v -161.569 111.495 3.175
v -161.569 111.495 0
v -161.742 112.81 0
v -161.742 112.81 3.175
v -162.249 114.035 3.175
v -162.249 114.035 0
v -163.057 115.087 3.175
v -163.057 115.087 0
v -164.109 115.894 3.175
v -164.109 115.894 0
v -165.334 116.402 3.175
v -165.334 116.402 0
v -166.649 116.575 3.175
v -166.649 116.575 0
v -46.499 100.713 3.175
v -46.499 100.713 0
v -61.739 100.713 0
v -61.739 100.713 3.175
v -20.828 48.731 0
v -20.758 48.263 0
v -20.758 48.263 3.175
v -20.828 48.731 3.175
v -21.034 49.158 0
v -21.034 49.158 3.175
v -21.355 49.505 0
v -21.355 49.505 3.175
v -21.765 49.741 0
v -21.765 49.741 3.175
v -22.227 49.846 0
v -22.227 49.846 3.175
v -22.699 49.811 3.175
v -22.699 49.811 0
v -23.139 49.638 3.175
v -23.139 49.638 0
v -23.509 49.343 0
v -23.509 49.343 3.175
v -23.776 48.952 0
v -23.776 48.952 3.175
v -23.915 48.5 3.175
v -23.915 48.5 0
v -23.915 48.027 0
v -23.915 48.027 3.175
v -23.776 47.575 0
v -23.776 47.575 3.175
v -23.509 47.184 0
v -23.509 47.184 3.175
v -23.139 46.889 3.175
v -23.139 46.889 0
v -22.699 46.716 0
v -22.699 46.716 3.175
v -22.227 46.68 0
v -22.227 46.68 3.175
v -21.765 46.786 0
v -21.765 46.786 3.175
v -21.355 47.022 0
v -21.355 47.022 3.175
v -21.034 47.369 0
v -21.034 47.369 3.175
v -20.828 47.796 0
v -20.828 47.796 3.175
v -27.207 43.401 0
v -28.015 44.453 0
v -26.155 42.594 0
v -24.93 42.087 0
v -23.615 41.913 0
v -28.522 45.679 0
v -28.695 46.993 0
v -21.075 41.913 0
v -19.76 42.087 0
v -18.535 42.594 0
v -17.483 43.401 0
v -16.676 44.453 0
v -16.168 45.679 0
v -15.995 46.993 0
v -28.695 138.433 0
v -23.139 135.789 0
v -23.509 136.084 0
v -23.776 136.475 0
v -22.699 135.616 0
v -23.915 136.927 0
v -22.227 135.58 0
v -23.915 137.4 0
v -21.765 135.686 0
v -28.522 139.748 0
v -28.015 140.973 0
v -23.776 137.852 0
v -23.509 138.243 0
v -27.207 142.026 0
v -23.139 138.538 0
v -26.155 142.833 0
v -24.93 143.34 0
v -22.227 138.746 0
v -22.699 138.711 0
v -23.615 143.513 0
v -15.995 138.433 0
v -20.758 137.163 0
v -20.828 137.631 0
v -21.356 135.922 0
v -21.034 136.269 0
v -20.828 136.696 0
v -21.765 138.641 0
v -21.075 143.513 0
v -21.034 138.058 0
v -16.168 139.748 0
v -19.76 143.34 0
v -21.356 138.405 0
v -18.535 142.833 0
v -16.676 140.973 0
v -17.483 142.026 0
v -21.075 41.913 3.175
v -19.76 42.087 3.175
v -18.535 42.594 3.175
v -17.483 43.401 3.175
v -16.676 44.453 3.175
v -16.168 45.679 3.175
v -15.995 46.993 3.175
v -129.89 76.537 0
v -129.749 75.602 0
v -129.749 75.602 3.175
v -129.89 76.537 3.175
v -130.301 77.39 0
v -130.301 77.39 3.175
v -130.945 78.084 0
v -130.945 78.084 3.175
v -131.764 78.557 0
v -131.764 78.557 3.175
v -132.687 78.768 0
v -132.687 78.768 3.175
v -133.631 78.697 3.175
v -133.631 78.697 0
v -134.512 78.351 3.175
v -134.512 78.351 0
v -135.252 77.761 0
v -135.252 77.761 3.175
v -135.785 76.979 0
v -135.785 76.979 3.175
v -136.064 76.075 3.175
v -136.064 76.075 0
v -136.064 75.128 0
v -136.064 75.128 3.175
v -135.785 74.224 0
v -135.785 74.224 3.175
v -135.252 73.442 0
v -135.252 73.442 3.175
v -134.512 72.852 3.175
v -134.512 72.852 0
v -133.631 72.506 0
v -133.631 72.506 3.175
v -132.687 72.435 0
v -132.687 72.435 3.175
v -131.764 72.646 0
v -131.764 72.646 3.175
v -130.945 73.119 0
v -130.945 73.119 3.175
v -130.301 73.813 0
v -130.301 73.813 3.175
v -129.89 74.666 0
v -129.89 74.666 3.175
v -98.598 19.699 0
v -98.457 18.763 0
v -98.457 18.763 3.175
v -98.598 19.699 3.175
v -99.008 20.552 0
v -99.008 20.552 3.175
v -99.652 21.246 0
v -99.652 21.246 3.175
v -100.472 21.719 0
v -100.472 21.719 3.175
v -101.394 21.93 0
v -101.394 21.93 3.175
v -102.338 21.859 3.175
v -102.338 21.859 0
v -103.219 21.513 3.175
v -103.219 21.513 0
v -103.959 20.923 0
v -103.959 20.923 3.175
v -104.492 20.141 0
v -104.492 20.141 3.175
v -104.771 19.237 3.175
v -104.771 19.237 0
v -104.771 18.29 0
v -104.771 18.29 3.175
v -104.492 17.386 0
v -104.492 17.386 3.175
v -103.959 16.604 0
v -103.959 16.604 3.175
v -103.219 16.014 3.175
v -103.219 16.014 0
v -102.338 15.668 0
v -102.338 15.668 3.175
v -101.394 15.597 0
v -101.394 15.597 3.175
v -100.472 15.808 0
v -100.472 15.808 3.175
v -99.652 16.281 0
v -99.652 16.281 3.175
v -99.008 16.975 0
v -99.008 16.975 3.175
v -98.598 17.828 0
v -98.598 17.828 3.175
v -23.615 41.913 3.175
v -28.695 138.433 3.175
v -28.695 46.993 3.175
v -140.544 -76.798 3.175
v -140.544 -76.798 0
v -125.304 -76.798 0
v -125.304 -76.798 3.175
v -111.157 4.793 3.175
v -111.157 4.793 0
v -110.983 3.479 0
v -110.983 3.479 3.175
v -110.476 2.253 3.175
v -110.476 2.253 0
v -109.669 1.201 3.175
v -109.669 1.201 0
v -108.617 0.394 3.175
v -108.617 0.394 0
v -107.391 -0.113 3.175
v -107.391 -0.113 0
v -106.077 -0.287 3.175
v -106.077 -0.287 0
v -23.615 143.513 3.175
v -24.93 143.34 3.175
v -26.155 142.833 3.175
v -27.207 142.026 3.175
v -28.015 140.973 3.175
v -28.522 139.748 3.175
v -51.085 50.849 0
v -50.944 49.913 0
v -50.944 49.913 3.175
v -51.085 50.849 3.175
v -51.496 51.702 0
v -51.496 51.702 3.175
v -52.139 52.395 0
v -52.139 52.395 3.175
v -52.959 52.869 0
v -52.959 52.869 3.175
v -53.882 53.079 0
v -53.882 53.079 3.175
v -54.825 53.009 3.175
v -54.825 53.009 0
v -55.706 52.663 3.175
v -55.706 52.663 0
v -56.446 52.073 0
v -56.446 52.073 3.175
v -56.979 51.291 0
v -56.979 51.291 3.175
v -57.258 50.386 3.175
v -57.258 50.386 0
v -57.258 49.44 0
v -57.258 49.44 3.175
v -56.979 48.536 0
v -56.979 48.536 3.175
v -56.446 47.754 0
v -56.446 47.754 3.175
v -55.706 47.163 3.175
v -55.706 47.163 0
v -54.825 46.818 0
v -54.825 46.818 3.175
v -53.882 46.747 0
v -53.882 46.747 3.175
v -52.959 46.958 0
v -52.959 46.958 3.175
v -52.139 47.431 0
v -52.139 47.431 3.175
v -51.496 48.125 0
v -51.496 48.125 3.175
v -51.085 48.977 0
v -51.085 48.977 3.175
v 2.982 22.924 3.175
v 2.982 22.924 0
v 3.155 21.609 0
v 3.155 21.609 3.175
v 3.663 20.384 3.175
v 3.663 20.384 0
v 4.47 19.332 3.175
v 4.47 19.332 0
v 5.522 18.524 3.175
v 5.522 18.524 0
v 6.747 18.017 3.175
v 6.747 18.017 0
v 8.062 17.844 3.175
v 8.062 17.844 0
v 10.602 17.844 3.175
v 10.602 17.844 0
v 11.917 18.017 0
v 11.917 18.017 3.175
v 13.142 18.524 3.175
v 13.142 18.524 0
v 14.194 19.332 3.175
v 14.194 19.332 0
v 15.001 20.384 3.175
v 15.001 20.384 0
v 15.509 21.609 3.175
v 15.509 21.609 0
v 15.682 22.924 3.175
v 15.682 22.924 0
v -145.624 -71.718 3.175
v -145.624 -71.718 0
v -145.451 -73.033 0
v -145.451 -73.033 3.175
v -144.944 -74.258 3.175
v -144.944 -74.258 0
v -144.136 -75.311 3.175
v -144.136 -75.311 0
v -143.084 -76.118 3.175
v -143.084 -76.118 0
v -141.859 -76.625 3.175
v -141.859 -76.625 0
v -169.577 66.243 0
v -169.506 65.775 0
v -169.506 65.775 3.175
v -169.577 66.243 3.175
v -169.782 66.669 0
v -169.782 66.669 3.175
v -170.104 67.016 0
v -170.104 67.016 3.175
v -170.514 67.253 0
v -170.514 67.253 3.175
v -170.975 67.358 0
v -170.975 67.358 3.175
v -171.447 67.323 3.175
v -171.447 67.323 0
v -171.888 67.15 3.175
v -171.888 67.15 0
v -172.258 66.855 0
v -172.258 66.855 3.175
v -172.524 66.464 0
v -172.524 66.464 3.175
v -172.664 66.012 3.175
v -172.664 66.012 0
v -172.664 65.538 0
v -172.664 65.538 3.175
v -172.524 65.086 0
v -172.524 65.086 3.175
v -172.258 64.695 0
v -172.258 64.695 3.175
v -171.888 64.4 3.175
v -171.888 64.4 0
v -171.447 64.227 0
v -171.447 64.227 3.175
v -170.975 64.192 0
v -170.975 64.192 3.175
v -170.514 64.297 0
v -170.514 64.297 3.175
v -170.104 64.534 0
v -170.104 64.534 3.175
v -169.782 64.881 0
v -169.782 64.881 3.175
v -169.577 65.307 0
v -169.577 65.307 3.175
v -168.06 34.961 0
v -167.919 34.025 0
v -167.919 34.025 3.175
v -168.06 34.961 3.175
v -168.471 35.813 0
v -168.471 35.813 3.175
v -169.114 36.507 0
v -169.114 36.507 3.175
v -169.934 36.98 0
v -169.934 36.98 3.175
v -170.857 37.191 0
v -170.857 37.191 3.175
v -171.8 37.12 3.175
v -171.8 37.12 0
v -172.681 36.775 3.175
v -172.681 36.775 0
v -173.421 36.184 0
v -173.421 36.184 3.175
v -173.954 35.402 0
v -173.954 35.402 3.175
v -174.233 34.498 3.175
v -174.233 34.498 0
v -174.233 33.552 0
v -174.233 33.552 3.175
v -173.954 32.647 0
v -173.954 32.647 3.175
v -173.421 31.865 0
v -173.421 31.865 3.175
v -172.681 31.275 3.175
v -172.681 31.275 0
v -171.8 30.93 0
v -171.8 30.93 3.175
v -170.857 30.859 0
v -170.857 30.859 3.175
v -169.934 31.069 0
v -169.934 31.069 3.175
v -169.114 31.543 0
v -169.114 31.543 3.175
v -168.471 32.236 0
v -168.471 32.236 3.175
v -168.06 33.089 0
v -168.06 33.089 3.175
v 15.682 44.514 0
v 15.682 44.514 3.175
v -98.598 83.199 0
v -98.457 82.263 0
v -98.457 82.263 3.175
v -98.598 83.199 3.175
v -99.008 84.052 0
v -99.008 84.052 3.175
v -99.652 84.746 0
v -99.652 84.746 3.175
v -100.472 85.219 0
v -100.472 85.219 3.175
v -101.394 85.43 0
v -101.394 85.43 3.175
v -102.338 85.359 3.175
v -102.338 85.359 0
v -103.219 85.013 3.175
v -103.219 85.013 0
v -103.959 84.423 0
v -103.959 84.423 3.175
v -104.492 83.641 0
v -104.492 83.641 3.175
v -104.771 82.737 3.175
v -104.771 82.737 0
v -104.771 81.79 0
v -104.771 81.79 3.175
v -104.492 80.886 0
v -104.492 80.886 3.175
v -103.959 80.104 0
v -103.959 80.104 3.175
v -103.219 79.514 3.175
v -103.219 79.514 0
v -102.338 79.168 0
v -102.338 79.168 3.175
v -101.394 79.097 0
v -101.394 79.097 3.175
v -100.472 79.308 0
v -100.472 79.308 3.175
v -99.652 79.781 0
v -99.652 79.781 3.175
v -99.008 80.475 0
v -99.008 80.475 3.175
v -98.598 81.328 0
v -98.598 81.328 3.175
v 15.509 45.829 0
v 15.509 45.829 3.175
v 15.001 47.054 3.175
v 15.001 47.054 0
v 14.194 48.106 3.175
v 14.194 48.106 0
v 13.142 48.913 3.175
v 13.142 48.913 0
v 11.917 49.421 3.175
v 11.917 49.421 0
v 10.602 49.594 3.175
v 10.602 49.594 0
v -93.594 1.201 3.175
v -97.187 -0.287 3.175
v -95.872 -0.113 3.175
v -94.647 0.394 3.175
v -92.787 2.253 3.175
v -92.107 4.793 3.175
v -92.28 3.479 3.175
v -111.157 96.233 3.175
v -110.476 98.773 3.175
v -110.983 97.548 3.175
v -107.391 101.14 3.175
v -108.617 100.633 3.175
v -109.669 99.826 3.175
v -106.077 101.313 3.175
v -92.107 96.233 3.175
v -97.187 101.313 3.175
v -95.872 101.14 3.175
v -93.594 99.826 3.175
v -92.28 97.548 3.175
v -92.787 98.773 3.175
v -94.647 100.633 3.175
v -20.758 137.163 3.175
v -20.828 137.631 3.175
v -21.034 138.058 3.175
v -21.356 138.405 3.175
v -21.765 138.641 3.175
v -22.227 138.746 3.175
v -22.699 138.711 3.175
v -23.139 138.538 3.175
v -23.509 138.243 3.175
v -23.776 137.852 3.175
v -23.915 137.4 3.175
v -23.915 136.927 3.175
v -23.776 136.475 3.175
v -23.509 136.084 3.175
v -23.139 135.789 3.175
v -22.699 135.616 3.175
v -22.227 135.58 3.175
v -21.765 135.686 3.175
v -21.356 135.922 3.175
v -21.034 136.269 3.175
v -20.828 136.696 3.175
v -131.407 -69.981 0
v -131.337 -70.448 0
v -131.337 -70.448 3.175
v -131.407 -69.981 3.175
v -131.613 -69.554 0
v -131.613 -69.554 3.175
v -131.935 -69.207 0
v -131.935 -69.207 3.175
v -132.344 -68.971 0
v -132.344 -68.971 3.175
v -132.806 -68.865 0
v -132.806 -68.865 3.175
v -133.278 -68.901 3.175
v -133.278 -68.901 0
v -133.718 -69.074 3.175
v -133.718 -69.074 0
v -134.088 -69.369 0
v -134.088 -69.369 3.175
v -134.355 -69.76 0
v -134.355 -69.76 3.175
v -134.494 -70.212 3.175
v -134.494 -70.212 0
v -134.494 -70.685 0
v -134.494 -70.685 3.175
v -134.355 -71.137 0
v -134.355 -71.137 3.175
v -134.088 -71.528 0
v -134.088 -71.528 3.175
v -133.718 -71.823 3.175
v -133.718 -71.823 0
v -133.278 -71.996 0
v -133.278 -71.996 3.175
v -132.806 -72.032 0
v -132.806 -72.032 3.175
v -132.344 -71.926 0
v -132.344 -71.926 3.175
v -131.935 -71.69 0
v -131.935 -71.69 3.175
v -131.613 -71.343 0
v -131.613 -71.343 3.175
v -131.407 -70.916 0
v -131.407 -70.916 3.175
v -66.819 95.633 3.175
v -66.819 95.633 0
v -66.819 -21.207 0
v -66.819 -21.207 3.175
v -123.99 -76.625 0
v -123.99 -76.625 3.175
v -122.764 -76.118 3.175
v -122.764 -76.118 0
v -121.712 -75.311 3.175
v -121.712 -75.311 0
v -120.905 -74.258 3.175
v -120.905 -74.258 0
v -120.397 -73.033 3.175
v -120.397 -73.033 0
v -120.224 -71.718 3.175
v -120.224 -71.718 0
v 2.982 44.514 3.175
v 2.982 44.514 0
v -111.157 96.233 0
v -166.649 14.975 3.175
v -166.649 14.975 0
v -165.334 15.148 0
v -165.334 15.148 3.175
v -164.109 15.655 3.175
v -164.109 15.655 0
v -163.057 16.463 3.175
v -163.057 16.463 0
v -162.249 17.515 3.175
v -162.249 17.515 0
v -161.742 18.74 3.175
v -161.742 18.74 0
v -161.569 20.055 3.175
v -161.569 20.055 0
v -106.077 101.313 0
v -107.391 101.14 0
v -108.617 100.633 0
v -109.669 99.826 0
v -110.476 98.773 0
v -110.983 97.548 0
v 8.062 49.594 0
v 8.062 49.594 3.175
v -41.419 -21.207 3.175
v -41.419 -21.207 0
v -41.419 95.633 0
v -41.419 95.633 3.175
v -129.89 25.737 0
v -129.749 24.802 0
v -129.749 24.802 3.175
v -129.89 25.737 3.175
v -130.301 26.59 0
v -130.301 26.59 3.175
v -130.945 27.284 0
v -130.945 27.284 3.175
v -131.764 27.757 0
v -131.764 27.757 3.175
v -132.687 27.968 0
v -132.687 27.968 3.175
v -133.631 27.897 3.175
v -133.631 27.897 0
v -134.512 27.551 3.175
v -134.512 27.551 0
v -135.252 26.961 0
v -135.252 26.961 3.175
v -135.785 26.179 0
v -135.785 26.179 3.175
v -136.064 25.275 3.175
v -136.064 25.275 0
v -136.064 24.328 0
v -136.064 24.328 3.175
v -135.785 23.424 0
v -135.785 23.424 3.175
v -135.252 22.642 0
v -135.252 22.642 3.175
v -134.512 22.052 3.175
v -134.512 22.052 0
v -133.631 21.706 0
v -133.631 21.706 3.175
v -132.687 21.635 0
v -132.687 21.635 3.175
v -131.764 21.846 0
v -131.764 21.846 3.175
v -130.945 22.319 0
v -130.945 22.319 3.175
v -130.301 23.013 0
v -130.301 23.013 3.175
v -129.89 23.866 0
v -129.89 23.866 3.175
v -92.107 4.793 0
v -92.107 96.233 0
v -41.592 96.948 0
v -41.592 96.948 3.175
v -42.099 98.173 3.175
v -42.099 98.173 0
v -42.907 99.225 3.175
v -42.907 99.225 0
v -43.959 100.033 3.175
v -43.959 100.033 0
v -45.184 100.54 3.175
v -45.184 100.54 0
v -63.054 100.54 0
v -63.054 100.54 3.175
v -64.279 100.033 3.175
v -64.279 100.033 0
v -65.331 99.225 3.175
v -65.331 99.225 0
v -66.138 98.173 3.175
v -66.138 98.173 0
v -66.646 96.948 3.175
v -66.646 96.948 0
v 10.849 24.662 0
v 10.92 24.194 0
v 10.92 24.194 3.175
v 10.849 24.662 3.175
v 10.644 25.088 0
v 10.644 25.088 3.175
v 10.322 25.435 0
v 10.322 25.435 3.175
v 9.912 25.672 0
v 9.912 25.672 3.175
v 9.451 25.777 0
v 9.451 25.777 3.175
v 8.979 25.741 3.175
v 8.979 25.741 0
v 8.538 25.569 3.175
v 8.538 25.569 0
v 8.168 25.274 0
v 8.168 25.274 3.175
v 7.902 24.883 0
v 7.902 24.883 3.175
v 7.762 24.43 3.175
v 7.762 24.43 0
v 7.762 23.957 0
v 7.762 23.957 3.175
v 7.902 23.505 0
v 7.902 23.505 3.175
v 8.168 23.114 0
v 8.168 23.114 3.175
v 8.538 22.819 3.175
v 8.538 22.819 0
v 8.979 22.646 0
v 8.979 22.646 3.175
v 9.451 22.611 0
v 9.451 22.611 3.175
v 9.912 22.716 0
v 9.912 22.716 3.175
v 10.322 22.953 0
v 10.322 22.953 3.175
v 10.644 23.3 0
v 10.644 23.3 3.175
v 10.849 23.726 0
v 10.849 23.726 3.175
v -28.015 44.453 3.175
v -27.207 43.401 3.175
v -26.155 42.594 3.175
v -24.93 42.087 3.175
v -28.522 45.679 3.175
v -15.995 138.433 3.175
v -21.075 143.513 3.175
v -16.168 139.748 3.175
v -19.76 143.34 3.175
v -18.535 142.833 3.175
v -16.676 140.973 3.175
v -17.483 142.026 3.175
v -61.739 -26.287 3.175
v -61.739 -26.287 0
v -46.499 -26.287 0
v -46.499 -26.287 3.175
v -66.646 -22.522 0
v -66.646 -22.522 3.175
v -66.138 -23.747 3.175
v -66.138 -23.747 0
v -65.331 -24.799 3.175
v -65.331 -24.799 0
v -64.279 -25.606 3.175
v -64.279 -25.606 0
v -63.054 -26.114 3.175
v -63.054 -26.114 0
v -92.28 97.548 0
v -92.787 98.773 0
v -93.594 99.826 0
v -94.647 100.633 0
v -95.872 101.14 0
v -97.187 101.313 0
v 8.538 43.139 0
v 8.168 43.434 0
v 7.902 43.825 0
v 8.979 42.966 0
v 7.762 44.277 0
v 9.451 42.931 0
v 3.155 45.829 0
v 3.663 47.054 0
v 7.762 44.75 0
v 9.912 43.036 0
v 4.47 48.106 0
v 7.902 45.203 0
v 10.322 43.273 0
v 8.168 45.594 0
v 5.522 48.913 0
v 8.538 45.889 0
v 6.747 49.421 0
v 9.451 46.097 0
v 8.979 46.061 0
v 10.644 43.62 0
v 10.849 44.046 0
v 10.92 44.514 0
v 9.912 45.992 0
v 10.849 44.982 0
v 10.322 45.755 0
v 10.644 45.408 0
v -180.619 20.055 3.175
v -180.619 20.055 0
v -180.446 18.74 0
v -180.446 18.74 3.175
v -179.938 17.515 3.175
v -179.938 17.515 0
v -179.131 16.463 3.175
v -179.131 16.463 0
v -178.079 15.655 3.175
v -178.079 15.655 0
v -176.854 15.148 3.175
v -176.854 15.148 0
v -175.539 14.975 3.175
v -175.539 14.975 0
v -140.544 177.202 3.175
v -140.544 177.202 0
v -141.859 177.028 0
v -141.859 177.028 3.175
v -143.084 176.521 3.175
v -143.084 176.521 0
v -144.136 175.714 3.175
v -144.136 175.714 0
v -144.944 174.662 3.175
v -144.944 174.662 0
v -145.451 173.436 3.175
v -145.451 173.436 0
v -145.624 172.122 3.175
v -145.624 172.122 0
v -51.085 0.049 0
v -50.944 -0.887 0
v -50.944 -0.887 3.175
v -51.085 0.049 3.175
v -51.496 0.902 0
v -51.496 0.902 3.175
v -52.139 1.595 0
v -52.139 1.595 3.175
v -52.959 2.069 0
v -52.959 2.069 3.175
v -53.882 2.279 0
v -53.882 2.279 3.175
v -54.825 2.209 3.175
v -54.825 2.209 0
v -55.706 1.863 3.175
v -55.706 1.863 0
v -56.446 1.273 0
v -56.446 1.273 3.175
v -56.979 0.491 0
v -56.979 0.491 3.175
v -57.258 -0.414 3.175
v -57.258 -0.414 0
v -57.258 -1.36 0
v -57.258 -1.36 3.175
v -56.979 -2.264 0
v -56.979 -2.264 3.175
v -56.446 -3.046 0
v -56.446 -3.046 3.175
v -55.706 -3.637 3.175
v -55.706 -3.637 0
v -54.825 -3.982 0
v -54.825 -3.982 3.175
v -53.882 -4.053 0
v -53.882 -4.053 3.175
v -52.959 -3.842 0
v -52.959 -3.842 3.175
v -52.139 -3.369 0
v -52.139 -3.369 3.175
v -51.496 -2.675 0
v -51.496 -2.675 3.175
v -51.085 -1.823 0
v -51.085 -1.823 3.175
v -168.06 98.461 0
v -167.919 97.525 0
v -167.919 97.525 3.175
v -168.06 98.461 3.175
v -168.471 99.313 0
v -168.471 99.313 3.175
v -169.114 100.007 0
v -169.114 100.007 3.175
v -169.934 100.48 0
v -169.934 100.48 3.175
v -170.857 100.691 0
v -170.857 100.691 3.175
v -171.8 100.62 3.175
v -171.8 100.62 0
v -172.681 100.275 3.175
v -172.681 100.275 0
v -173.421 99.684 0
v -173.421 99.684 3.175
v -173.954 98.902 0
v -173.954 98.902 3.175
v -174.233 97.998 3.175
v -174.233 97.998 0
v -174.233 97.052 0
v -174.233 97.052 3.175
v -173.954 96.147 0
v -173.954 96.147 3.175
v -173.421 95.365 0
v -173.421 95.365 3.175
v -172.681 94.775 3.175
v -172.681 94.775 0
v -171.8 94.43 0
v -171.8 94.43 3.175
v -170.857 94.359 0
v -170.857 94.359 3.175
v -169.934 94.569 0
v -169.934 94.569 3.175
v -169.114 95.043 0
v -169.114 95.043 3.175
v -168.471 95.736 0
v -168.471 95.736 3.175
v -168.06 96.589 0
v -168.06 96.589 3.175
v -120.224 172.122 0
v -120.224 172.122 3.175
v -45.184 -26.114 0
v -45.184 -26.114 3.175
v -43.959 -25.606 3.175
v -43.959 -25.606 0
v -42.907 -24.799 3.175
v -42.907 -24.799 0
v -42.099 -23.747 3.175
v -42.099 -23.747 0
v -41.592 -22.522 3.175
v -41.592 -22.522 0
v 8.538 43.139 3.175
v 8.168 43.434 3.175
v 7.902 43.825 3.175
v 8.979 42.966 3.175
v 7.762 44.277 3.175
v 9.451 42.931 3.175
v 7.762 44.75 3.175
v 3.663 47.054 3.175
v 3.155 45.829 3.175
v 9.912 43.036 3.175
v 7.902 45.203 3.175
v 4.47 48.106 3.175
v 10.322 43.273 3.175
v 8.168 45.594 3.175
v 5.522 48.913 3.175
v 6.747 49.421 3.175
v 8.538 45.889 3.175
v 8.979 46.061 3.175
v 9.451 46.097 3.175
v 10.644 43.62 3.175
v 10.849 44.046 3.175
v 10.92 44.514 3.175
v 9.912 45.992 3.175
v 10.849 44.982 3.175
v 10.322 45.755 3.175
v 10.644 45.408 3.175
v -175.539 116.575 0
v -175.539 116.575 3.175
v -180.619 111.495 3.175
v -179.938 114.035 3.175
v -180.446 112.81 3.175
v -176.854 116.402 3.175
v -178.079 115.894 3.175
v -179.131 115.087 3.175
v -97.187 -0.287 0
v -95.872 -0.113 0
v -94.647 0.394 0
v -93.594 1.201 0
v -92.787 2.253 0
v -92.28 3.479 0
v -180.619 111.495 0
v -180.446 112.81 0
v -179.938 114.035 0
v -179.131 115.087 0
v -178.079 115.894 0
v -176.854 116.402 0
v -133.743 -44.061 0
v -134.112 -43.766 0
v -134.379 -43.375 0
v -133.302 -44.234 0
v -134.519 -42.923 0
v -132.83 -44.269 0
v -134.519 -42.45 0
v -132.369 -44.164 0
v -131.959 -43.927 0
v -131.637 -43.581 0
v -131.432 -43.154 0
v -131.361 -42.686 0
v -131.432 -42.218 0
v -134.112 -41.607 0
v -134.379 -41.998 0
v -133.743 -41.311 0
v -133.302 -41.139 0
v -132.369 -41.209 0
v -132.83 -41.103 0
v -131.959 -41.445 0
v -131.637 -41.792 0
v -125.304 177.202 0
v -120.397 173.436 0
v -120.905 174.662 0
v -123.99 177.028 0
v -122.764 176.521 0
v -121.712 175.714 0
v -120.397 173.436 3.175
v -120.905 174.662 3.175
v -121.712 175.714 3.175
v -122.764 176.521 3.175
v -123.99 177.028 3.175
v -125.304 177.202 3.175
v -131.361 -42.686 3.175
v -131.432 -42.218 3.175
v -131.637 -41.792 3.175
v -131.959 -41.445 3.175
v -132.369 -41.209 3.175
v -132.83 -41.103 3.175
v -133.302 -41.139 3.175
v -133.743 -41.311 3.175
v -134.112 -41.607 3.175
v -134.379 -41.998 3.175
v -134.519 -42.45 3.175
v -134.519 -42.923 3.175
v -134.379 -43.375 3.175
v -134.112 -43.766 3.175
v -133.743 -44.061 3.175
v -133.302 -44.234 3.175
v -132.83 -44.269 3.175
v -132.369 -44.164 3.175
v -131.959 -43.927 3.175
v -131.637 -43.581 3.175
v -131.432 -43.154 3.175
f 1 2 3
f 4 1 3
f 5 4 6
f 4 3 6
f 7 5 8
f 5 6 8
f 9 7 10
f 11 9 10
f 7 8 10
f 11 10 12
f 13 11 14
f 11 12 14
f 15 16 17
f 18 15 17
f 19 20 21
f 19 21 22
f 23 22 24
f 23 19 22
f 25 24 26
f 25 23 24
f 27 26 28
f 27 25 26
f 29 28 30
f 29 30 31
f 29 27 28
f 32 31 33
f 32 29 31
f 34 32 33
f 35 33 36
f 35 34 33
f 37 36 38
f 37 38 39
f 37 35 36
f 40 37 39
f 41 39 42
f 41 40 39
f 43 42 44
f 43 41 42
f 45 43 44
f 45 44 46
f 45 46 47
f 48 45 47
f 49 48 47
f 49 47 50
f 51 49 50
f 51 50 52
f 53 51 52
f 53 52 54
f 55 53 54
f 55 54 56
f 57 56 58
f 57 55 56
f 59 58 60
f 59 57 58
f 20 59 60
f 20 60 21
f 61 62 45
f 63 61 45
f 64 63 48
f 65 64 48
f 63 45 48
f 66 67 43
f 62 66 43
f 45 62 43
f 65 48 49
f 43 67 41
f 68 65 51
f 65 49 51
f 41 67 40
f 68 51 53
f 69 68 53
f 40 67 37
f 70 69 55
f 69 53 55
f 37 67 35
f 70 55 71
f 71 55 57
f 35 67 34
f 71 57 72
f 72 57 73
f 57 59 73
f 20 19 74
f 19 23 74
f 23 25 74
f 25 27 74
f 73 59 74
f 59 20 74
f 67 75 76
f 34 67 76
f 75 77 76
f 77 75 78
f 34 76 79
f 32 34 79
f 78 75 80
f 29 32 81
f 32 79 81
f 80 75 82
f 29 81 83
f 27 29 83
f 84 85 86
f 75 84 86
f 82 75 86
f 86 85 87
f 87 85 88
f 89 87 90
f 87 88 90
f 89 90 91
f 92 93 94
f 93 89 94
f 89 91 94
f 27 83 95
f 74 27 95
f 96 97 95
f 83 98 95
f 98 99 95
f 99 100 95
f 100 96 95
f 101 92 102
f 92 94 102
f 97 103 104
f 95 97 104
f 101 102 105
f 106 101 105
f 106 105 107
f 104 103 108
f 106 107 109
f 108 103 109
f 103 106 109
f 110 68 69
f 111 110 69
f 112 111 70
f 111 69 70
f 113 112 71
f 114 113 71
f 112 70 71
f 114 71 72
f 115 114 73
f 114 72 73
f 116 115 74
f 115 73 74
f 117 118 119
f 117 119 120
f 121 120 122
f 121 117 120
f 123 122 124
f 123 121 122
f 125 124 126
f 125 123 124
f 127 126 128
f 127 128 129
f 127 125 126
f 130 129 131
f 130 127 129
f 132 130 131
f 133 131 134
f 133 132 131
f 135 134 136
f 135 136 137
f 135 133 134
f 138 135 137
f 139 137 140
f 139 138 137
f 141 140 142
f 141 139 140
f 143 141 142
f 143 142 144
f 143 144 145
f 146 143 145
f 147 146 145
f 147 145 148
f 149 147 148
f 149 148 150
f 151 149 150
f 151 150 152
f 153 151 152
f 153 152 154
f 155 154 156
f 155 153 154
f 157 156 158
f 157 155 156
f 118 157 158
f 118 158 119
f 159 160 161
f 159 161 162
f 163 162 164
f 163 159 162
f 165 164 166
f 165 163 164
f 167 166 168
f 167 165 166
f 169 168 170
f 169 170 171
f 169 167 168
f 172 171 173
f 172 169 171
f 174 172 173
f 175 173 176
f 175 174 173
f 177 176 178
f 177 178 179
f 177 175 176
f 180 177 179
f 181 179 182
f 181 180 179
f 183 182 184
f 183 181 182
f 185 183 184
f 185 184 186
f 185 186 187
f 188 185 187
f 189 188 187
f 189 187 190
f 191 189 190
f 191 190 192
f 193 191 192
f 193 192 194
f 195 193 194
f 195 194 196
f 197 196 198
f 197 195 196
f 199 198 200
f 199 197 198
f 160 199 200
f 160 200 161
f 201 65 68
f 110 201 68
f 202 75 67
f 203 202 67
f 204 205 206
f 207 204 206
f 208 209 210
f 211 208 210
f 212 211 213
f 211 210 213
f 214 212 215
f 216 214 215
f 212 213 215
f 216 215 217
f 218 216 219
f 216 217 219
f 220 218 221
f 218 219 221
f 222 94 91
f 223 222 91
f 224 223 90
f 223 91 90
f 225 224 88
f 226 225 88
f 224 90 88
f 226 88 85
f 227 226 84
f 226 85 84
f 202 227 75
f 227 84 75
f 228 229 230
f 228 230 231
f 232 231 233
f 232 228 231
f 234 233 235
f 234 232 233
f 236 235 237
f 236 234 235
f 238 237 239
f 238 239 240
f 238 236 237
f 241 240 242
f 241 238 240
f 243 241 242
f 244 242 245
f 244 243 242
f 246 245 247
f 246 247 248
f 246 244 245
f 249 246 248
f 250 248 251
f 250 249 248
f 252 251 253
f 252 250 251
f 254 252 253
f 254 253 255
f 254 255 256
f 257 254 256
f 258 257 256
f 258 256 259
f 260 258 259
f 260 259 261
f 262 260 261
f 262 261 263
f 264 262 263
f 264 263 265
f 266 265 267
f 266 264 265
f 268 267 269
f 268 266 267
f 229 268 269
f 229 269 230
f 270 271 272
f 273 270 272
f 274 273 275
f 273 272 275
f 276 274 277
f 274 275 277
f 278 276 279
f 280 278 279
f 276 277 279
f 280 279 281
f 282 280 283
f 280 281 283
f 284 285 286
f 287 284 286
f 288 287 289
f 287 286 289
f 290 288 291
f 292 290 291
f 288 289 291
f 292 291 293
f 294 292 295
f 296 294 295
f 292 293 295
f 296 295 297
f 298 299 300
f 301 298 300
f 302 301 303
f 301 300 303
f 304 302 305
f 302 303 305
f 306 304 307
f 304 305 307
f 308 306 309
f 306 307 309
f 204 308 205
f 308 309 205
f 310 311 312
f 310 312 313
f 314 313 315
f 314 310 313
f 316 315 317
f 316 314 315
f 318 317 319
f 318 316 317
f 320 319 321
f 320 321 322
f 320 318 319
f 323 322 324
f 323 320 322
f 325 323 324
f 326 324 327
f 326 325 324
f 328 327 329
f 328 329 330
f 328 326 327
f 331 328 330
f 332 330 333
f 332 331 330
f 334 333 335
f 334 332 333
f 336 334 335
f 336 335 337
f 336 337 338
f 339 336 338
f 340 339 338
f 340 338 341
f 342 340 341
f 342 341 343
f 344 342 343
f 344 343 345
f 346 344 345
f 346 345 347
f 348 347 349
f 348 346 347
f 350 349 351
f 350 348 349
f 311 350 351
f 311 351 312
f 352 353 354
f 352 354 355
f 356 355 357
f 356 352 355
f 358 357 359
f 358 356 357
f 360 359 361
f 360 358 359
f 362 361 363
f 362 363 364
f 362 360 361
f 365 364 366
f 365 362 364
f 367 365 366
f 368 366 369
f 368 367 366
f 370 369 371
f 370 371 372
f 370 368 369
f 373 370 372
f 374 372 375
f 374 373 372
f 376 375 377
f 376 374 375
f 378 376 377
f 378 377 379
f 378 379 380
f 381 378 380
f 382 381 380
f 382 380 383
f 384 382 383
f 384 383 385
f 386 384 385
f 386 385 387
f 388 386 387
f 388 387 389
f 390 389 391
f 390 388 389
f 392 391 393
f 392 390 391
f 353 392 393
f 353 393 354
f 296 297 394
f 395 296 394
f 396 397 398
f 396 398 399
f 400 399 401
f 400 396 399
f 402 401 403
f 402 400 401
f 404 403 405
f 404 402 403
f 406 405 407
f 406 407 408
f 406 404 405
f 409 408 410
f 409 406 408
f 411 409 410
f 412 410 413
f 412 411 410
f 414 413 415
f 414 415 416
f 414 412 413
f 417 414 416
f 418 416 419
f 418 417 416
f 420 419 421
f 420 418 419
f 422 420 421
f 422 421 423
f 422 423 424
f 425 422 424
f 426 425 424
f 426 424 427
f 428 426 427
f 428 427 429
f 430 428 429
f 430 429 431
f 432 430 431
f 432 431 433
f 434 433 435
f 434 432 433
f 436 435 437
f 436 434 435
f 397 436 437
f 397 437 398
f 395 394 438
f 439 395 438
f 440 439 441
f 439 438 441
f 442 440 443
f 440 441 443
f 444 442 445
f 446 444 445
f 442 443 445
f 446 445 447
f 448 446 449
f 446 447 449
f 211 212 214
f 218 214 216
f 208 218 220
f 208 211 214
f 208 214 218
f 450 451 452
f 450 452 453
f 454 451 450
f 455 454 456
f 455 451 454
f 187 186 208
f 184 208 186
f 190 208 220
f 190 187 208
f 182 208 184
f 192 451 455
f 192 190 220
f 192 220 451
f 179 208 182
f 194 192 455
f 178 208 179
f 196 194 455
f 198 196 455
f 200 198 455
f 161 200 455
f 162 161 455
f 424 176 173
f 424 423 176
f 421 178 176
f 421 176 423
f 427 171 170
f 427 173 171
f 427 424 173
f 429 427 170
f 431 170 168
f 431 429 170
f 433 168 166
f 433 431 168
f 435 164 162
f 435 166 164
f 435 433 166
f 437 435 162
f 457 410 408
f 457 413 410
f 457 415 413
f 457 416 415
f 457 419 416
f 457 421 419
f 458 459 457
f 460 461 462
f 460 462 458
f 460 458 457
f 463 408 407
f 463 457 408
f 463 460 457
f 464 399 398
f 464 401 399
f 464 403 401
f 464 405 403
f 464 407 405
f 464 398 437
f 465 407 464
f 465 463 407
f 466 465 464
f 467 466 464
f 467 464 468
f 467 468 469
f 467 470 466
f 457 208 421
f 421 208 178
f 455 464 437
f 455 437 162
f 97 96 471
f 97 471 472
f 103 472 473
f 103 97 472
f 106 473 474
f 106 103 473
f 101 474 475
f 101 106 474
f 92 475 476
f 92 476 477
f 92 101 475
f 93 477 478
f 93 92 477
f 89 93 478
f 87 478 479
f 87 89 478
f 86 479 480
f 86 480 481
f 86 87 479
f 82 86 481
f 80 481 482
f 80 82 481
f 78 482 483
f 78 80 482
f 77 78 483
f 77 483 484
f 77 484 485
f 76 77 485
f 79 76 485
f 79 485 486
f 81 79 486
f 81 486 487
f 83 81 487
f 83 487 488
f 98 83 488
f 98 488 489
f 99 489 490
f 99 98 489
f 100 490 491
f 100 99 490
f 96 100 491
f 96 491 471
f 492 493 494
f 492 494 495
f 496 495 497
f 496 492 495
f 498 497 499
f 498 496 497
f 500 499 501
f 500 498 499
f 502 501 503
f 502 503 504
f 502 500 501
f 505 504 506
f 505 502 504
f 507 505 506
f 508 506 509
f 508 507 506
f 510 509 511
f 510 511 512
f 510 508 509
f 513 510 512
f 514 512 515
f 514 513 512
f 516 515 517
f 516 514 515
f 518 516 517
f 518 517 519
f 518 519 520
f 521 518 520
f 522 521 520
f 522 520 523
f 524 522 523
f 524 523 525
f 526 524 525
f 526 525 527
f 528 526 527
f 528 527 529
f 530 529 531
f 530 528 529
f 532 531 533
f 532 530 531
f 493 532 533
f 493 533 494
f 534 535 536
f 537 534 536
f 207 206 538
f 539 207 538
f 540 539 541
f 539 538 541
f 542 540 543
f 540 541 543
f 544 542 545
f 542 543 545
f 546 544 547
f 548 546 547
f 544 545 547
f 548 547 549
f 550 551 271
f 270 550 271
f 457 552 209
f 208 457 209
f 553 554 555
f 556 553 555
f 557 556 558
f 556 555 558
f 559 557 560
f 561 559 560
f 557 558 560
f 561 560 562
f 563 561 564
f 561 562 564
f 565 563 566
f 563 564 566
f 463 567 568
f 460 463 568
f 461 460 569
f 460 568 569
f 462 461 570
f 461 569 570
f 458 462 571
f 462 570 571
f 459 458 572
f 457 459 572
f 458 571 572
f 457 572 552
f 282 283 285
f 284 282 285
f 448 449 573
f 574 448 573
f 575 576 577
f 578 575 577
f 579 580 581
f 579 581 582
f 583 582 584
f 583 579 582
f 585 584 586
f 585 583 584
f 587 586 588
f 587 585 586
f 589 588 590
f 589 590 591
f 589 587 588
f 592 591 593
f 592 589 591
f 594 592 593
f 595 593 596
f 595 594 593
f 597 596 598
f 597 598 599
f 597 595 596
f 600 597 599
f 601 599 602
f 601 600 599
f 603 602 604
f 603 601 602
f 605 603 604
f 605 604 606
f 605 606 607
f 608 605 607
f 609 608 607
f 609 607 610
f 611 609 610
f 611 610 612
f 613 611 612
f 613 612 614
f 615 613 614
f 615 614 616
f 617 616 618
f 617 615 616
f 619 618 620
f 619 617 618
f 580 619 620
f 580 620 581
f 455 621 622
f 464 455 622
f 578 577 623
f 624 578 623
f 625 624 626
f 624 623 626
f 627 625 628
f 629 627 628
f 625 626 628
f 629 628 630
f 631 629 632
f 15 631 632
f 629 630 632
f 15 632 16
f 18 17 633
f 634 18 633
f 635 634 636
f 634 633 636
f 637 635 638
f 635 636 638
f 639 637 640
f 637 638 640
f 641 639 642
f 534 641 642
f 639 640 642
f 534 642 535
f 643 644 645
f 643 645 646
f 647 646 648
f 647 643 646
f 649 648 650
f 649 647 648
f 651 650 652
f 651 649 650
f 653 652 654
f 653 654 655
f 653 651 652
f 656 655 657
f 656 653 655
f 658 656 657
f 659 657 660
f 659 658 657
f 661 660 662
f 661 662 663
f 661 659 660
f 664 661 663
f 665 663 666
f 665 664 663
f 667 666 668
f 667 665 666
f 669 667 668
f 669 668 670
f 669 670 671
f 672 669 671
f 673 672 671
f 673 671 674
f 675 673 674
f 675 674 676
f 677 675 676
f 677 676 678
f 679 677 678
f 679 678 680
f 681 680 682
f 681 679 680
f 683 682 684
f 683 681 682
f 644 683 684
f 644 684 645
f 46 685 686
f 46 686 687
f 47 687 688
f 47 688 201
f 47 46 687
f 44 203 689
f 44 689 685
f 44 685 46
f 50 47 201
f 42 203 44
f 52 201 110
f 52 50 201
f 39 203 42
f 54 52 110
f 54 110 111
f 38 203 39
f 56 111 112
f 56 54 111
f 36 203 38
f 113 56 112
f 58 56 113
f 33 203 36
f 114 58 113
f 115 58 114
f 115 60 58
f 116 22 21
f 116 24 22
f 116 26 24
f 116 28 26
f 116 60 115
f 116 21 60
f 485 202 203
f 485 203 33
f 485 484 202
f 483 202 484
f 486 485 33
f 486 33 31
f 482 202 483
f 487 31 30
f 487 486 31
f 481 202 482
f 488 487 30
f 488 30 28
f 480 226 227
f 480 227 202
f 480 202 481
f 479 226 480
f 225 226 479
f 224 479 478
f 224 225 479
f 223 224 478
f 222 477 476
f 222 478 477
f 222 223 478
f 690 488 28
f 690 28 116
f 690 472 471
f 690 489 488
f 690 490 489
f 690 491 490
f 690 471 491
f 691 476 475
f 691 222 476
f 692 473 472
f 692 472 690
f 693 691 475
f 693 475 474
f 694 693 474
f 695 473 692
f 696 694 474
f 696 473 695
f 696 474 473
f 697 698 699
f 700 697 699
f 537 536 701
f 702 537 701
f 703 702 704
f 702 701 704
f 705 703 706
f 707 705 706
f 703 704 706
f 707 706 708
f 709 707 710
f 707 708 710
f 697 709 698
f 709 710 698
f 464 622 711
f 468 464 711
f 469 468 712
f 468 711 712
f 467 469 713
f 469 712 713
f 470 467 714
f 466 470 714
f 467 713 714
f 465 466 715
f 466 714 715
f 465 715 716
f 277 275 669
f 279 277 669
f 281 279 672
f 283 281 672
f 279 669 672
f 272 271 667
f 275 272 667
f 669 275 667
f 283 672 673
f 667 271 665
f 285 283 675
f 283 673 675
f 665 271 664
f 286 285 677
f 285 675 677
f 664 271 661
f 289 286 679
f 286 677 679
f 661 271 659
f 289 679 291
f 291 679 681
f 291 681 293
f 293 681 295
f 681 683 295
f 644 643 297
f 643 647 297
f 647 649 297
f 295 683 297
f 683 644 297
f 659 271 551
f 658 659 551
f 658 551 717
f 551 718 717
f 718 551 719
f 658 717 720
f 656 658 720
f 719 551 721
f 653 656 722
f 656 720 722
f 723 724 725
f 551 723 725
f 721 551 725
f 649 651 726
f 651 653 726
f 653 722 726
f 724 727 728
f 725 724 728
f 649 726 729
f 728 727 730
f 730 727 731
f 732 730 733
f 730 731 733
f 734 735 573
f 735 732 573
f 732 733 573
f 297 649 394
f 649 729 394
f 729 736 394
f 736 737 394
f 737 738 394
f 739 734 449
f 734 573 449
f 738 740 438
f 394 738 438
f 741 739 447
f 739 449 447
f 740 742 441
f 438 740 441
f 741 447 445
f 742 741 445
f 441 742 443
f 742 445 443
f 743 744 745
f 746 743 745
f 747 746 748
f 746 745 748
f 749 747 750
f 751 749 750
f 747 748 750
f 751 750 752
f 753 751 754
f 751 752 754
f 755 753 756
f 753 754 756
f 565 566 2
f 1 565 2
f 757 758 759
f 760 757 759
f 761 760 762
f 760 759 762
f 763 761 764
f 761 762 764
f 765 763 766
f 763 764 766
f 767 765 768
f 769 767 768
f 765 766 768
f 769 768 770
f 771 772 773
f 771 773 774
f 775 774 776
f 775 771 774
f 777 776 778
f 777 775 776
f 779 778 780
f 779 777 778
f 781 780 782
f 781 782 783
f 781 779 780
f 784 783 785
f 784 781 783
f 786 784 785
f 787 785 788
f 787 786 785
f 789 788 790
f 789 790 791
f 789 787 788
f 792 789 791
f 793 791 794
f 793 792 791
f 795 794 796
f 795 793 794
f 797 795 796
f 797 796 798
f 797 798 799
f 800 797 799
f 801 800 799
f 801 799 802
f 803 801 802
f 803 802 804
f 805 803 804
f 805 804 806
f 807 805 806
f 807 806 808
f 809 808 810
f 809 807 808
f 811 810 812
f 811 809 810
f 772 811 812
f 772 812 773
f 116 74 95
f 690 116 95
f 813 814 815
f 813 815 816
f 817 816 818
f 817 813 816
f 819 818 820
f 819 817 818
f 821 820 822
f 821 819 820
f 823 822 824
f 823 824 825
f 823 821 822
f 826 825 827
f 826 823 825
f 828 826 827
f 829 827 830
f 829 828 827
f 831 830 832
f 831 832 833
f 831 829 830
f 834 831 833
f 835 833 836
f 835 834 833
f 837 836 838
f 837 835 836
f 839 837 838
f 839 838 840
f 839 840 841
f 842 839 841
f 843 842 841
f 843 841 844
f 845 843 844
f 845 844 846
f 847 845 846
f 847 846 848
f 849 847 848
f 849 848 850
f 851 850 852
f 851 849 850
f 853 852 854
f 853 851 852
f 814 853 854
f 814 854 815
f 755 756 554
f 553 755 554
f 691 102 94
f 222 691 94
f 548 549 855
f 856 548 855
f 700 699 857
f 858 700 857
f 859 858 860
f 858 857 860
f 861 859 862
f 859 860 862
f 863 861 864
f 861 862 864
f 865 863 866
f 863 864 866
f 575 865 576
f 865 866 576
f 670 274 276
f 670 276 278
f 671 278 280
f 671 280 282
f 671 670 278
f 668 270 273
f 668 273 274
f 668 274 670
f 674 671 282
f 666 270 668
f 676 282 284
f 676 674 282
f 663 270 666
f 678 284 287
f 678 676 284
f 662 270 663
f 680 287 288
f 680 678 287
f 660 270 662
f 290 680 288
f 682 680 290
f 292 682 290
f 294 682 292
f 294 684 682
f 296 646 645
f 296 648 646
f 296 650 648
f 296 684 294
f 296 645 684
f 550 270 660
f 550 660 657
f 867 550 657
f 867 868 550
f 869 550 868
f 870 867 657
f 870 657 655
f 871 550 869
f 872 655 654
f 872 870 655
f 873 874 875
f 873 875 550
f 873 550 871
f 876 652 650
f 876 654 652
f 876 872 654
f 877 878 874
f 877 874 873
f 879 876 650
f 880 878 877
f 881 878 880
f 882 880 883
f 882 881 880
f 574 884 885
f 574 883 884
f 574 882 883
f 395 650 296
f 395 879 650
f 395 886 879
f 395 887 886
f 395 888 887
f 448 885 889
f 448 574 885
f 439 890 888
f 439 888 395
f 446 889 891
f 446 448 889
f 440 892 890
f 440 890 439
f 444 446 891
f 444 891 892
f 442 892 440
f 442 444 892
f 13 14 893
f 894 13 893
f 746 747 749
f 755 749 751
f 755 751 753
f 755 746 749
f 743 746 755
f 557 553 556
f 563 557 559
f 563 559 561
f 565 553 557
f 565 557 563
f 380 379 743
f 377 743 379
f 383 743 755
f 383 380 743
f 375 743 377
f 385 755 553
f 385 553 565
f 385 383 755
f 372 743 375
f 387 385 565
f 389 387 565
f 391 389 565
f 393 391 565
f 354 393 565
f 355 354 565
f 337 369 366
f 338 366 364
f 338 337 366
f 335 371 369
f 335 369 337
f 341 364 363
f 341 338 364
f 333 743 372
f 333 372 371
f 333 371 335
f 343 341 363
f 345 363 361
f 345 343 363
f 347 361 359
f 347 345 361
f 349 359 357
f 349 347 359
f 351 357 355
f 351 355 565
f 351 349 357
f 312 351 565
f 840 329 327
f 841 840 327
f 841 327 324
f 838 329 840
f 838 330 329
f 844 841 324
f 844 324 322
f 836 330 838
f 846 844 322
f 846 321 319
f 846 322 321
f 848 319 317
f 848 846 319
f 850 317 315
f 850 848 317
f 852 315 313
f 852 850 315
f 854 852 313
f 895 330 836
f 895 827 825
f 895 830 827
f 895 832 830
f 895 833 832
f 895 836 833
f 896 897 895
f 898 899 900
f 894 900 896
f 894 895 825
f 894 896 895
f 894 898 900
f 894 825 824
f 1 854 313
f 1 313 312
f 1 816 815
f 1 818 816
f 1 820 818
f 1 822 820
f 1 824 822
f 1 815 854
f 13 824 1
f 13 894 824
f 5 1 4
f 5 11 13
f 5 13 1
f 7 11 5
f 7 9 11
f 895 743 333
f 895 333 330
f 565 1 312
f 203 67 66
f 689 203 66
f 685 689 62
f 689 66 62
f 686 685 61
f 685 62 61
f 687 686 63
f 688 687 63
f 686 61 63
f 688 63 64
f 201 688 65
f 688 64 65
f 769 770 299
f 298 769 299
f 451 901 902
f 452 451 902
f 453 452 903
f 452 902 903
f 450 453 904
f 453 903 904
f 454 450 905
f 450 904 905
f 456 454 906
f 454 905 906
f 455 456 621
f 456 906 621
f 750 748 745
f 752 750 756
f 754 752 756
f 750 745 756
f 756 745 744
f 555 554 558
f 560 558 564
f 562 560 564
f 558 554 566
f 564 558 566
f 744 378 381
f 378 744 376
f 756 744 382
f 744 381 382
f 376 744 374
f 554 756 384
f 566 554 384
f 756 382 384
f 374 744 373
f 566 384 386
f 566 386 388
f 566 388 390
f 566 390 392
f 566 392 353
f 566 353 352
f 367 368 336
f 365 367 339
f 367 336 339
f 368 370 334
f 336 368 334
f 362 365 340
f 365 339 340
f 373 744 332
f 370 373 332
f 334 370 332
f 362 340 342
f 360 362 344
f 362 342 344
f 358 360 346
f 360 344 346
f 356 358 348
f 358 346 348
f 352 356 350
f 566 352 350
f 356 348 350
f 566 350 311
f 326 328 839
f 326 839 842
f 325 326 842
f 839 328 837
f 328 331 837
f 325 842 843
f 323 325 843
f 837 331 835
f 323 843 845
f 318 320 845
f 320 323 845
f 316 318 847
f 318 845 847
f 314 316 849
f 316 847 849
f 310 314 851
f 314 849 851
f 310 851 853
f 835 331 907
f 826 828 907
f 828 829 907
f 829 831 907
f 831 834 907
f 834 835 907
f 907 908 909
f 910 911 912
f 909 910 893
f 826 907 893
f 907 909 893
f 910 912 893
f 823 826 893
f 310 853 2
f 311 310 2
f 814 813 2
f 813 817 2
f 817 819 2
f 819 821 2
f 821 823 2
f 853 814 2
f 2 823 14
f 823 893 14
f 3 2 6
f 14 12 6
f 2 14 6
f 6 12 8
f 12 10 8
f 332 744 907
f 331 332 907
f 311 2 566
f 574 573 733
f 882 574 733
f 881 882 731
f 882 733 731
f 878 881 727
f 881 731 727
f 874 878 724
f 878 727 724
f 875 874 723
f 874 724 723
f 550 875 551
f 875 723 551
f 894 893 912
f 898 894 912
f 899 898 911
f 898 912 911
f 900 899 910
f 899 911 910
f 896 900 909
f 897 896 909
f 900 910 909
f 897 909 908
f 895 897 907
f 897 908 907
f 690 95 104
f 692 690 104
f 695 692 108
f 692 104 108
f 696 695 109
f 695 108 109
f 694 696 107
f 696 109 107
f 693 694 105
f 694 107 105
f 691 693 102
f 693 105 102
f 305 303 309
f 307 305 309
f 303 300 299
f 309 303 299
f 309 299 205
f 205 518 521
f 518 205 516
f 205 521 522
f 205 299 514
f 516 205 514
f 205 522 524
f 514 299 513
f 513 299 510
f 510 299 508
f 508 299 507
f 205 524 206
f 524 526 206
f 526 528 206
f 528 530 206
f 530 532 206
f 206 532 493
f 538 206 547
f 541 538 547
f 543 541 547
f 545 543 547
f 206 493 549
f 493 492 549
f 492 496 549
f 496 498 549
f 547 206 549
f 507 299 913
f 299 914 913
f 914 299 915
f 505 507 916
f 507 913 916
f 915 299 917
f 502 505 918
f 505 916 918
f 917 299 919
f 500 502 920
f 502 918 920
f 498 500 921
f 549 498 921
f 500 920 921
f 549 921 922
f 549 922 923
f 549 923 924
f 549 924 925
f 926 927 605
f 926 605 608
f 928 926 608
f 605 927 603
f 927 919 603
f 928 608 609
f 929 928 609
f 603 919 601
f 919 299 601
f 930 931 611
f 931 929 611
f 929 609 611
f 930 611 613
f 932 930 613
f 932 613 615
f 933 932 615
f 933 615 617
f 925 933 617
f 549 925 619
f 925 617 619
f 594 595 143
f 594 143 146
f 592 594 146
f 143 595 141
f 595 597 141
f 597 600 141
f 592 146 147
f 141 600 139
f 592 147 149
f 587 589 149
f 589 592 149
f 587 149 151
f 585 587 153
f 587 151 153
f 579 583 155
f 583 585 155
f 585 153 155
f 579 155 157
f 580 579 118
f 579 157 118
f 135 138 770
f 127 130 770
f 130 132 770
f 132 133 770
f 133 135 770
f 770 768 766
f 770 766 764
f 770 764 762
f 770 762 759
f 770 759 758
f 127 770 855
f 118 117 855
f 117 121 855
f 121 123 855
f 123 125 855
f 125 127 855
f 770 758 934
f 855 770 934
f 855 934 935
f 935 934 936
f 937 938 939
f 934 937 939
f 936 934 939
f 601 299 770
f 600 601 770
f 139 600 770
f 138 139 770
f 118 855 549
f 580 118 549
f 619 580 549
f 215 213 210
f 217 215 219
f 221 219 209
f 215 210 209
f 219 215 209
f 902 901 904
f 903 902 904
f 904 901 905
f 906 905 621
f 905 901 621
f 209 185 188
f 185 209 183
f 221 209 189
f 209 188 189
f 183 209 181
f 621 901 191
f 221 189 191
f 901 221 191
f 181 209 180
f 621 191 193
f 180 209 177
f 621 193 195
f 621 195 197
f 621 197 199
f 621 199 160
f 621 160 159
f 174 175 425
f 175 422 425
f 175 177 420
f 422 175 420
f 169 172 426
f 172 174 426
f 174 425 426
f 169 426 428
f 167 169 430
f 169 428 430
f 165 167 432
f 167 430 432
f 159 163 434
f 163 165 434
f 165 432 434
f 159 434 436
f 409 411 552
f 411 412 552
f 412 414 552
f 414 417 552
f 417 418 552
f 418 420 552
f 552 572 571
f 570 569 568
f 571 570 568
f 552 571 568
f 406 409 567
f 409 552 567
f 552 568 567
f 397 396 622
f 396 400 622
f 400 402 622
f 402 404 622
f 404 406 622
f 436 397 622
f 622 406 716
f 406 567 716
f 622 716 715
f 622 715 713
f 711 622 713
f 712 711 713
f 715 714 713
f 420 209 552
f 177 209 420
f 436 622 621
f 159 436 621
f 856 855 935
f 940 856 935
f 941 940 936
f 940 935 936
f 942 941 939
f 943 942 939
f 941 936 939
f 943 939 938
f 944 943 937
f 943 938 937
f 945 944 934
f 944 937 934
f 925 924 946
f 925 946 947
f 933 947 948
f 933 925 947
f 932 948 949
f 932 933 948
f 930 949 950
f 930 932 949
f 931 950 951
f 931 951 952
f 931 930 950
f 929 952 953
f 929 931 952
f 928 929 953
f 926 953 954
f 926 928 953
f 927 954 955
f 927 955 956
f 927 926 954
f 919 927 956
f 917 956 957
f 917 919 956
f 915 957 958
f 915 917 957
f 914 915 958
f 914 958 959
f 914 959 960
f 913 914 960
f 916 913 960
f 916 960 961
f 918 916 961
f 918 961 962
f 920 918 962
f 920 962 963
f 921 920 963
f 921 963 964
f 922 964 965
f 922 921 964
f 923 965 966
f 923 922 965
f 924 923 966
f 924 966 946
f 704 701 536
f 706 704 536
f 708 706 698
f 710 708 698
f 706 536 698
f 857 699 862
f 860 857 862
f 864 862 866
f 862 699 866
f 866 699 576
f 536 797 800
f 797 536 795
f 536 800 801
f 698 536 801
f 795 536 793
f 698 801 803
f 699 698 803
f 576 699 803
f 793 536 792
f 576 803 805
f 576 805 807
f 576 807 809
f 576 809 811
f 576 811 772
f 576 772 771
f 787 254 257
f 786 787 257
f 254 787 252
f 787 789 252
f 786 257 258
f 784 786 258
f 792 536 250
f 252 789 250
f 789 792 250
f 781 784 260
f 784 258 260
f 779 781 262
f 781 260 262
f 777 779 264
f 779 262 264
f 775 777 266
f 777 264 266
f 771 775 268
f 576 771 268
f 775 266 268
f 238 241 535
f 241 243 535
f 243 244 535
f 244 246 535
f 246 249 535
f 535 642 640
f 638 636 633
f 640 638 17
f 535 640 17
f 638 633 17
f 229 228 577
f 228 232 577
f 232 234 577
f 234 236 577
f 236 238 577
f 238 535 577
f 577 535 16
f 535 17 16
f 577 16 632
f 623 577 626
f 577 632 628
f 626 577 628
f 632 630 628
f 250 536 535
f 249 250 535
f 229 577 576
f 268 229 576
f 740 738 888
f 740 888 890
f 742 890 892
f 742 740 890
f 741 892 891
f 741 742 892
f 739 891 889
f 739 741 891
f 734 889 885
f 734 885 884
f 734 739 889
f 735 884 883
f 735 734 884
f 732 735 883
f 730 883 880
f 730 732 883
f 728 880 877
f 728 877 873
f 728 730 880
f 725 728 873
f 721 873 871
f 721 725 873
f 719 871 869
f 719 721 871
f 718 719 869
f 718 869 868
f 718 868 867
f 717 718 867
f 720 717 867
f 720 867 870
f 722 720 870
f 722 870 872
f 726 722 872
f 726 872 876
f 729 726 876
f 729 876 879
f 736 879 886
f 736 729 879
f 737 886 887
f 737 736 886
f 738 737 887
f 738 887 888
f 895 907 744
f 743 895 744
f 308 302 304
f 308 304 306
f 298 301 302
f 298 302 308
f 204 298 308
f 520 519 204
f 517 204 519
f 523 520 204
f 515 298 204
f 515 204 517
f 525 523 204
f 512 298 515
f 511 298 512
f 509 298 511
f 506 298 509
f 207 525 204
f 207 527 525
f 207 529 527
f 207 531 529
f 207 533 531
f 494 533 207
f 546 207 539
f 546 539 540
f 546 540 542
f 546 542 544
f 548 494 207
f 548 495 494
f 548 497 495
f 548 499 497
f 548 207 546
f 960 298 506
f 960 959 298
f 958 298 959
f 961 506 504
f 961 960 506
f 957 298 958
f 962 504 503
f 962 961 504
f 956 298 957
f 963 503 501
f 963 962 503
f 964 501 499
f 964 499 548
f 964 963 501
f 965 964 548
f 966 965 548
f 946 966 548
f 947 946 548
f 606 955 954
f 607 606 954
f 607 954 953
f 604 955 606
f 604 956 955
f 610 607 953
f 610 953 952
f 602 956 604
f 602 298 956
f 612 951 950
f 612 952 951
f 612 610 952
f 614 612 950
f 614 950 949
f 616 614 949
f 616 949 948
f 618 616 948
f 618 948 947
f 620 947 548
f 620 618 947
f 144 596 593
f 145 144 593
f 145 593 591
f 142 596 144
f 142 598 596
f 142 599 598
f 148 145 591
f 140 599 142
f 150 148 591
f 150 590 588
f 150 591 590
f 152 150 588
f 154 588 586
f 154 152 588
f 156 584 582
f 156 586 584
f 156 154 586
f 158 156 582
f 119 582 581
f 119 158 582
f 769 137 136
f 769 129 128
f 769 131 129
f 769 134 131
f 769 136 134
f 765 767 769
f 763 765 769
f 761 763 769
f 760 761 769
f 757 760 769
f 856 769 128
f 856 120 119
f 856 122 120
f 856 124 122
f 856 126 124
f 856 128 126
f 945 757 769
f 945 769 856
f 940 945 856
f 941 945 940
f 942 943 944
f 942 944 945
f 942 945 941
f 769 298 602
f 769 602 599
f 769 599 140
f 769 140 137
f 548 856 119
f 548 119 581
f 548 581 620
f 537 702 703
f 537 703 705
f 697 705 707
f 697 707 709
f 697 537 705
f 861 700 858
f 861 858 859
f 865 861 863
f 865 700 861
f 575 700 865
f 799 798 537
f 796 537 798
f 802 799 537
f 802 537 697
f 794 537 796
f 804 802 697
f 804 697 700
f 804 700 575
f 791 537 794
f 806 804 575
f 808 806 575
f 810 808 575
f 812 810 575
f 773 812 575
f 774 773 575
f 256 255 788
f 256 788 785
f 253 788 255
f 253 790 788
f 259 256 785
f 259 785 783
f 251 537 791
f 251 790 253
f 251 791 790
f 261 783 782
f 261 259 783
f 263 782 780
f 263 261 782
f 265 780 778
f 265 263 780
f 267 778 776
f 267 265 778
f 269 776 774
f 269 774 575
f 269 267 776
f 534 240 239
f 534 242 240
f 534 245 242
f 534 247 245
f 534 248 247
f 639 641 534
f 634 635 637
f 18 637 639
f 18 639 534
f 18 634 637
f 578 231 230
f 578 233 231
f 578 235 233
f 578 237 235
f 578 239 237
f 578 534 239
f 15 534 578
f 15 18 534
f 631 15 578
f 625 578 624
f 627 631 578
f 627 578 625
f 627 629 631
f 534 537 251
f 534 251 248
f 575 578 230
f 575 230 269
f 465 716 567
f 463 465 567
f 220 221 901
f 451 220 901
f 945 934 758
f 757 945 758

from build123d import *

# Parameters (mm, degrees)
F0_R      = 1.5875
F0_R_2    = 3.175
F6_DEPTH  = 3.175
F2_R      = 3.175
F7_DEPTH  = 3.175
F1_R      = 3.175
F8_DEPTH  = 3.175
F3_R      = 1.5875
F9_DEPTH  = 3.175
F4_R      = 3.175
F4_R_2    = 1.5875
F10_DEPTH = 3.175
F5_R      = 1.5875
F11_DEPTH = 3.175


# Not quite as in the source:
# - a length typed as a fraction of an inch, garbled in the dataset ("3 / 203.2 mm" for 3/8 in), is restored
# - a feature names something its author has since deleted; it is built from what else it names


with BuildPart() as f6:
    # F0 (on Top) → F6 (new body)
    with BuildSketch(Plane.XY):
        with BuildLine():
            Line((-125.3043544817, 177.201503253), (-140.5443544817, 177.201503253))
            ThreePointArc((-140.5443544817, 177.201503253), (-144.1364569301, 175.7136057014), (-145.6243544817, 172.121503253))
            Line((-145.6243544817, 172.121503253), (-145.6243544817, -71.718496747))
            ThreePointArc((-145.6243544817, -71.718496747), (-144.1364569301, -75.3105991954), (-140.5443544817, -76.798496747))
            Line((-140.5443544817, -76.798496747), (-125.3043544817, -76.798496747))
            ThreePointArc((-125.3043544817, -76.798496747), (-121.7122520333, -75.3105991954), (-120.2243544817, -71.718496747))
            Line((-120.2243544817, -71.718496747), (-120.2243544817, 172.121503253))
            ThreePointArc((-120.2243544817, 172.121503253), (-121.7122520333, 175.7136057014), (-125.3043544817, 177.201503253))
        make_face()
        with Locations((-132.9243544817, -70.448496747)):
            Circle(F0_R, mode=Mode.SUBTRACT)
        with Locations((-132.948756218, -42.686296747)):
            Circle(F0_R, mode=Mode.SUBTRACT)
        with Locations((-132.9243544817, 24.801503253)):
            Circle(F0_R_2, mode=Mode.SUBTRACT)
        with Locations((-132.9243544817, 75.601503253)):
            Circle(F0_R_2, mode=Mode.SUBTRACT)
    extrude(amount=F6_DEPTH)


with BuildPart() as f7:
    # F2 (on Top) → F7 (new body)
    with BuildSketch(Plane.XY):
        with BuildLine():
            Line((-97.1865381289, 101.3134590626), (-106.0765381289, 101.3134590626))
            ThreePointArc((-106.0765381289, 101.3134590626), (-109.6686405773, 99.825561511), (-111.1565381289, 96.2334590626))
            Line((-111.1565381289, 96.2334590626), (-111.1565381289, 4.7934590626))
            ThreePointArc((-111.1565381289, 4.7934590626), (-109.6686405773, 1.2013566141), (-106.0765381289, -0.2865409374))
            Line((-106.0765381289, -0.2865409374), (-97.1865381289, -0.2865409374))
            ThreePointArc((-97.1865381289, -0.2865409374), (-93.5944356804, 1.2013566141), (-92.1065381289, 4.7934590626))
            Line((-92.1065381289, 4.7934590626), (-92.1065381289, 96.2334590626))
            ThreePointArc((-92.1065381289, 96.2334590626), (-93.5944356804, 99.825561511), (-97.1865381289, 101.3134590626))
        make_face()
        with Locations((-101.6315381289, 18.7634590626)):
            Circle(F2_R, mode=Mode.SUBTRACT)
        with Locations((-101.6315381289, 82.2634590626)):
            Circle(F2_R, mode=Mode.SUBTRACT)
    extrude(amount=F7_DEPTH)


with BuildPart() as f8:
    # F1 (on Top) → F8 (new body)
    with BuildSketch(Plane.XY):
        with BuildLine():
            Line((-46.4988631535, 100.7131136298), (-61.7388631535, 100.7131136298))
            ThreePointArc((-61.7388631535, 100.7131136298), (-65.3309656019, 99.2252160782), (-66.8188631535, 95.6331136298))
            Line((-66.8188631535, 95.6331136298), (-66.8188631535, -21.2068863702))
            ThreePointArc((-66.8188631535, -21.2068863702), (-65.3309656019, -24.7989888186), (-61.7388631535, -26.2868863702))
            Line((-61.7388631535, -26.2868863702), (-46.4988631535, -26.2868863702))
            ThreePointArc((-46.4988631535, -26.2868863702), (-42.906760705, -24.7989888186), (-41.4188631535, -21.2068863702))
            Line((-41.4188631535, -21.2068863702), (-41.4188631535, 95.6331136298))
            ThreePointArc((-41.4188631535, 95.6331136298), (-42.906760705, 99.2252160782), (-46.4988631535, 100.7131136298))
        make_face()
        with Locations((-54.1188631535, -0.8868863702)):
            Circle(F1_R, mode=Mode.SUBTRACT)
        with Locations((-54.1188631535, 49.9131136298)):
            Circle(F1_R, mode=Mode.SUBTRACT)
    extrude(amount=F8_DEPTH)


with BuildPart() as f9:
    # F3 (on Top) → F9 (new body)
    with BuildSketch(Plane.XY):
        with BuildLine():
            Line((-21.075289588, 143.5134345447), (-23.615289588, 143.5134345447))
            ThreePointArc((-23.615289588, 143.5134345447), (-27.2073920364, 142.0255369931), (-28.695289588, 138.4334345447))
            Line((-28.695289588, 138.4334345447), (-28.695289588, 46.9934345447))
            ThreePointArc((-28.695289588, 46.9934345447), (-27.2073920364, 43.4013320963), (-23.615289588, 41.9134345447))
            Line((-23.615289588, 41.9134345447), (-21.075289588, 41.9134345447))
            ThreePointArc((-21.075289588, 41.9134345447), (-17.4831871395, 43.4013320963), (-15.995289588, 46.9934345447))
            Line((-15.995289588, 46.9934345447), (-15.995289588, 138.4334345447))
            ThreePointArc((-15.995289588, 138.4334345447), (-17.4831871395, 142.0255369931), (-21.075289588, 143.5134345447))
        make_face()
        with Locations((-22.345289588, 48.2634345447)):
            Circle(F3_R, mode=Mode.SUBTRACT)
        with Locations((-22.3452951759, 137.1634345447)):
            Circle(F3_R, mode=Mode.SUBTRACT)
    extrude(amount=F9_DEPTH)


with BuildPart() as f10:
    # F4 (on Top) → F10 (new body)
    with BuildSketch(Plane.XY):
        with BuildLine():
            Line((-166.6488225746, 116.5749058127), (-175.5388225746, 116.5749058127))
            ThreePointArc((-175.5388225746, 116.5749058127), (-179.130925023, 115.0870082612), (-180.6188225746, 111.4949058127))
            Line((-180.6188225746, 111.4949058127), (-180.6188225746, 20.0549058127))
            ThreePointArc((-180.6188225746, 20.0549058127), (-179.130925023, 16.4628033643), (-175.5388225746, 14.9749058127))
            Line((-175.5388225746, 14.9749058127), (-166.6488225746, 14.9749058127))
            ThreePointArc((-166.6488225746, 14.9749058127), (-163.0567201262, 16.4628033643), (-161.5688225746, 20.0549058127))
            Line((-161.5688225746, 20.0549058127), (-161.5688225746, 111.4949058127))
            ThreePointArc((-161.5688225746, 111.4949058127), (-163.0567201262, 115.0870082612), (-166.6488225746, 116.5749058127))
        make_face()
        with Locations((-171.0938225746, 34.0249058127)):
            Circle(F4_R, mode=Mode.SUBTRACT)
        with Locations((-171.0938225746, 65.7749058127)):
            Circle(F4_R_2, mode=Mode.SUBTRACT)
        with Locations((-171.0938225746, 97.5249058127)):
            Circle(F4_R, mode=Mode.SUBTRACT)
    extrude(amount=F10_DEPTH)


with BuildPart() as f11:
    # F5 (on Top) → F11 (new body)
    with BuildSketch(Plane.XY):
        with BuildLine():
            Line((10.6020793927, 49.5937959403), (8.0620793927, 49.5937959403))
            ThreePointArc((8.0620793927, 49.5937959403), (4.4699769443, 48.1058983887), (2.9820793927, 44.5137959403))
            Line((2.9820793927, 44.5137959403), (2.9820793927, 22.9237959403))
            ThreePointArc((2.9820793927, 22.9237959403), (4.4699769443, 19.3316934919), (8.0620793927, 17.8437959403))
            Line((8.0620793927, 17.8437959403), (10.6020793927, 17.8437959403))
            ThreePointArc((10.6020793927, 17.8437959403), (14.1941818412, 19.3316934919), (15.6820793927, 22.9237959403))
            Line((15.6820793927, 22.9237959403), (15.6820793927, 44.5137959403))
            ThreePointArc((15.6820793927, 44.5137959403), (14.1941818412, 48.1058983887), (10.6020793927, 49.5937959403))
        make_face()
        with Locations((9.3320793927, 24.1937959403)):
            Circle(F5_R, mode=Mode.SUBTRACT)
        with Locations((9.3320793927, 44.5137959403)):
            Circle(F5_R, mode=Mode.SUBTRACT)
    extrude(amount=F11_DEPTH)


solid = Compound([f6.part, f7.part, f8.part, f9.part, f10.part, f11.part])
